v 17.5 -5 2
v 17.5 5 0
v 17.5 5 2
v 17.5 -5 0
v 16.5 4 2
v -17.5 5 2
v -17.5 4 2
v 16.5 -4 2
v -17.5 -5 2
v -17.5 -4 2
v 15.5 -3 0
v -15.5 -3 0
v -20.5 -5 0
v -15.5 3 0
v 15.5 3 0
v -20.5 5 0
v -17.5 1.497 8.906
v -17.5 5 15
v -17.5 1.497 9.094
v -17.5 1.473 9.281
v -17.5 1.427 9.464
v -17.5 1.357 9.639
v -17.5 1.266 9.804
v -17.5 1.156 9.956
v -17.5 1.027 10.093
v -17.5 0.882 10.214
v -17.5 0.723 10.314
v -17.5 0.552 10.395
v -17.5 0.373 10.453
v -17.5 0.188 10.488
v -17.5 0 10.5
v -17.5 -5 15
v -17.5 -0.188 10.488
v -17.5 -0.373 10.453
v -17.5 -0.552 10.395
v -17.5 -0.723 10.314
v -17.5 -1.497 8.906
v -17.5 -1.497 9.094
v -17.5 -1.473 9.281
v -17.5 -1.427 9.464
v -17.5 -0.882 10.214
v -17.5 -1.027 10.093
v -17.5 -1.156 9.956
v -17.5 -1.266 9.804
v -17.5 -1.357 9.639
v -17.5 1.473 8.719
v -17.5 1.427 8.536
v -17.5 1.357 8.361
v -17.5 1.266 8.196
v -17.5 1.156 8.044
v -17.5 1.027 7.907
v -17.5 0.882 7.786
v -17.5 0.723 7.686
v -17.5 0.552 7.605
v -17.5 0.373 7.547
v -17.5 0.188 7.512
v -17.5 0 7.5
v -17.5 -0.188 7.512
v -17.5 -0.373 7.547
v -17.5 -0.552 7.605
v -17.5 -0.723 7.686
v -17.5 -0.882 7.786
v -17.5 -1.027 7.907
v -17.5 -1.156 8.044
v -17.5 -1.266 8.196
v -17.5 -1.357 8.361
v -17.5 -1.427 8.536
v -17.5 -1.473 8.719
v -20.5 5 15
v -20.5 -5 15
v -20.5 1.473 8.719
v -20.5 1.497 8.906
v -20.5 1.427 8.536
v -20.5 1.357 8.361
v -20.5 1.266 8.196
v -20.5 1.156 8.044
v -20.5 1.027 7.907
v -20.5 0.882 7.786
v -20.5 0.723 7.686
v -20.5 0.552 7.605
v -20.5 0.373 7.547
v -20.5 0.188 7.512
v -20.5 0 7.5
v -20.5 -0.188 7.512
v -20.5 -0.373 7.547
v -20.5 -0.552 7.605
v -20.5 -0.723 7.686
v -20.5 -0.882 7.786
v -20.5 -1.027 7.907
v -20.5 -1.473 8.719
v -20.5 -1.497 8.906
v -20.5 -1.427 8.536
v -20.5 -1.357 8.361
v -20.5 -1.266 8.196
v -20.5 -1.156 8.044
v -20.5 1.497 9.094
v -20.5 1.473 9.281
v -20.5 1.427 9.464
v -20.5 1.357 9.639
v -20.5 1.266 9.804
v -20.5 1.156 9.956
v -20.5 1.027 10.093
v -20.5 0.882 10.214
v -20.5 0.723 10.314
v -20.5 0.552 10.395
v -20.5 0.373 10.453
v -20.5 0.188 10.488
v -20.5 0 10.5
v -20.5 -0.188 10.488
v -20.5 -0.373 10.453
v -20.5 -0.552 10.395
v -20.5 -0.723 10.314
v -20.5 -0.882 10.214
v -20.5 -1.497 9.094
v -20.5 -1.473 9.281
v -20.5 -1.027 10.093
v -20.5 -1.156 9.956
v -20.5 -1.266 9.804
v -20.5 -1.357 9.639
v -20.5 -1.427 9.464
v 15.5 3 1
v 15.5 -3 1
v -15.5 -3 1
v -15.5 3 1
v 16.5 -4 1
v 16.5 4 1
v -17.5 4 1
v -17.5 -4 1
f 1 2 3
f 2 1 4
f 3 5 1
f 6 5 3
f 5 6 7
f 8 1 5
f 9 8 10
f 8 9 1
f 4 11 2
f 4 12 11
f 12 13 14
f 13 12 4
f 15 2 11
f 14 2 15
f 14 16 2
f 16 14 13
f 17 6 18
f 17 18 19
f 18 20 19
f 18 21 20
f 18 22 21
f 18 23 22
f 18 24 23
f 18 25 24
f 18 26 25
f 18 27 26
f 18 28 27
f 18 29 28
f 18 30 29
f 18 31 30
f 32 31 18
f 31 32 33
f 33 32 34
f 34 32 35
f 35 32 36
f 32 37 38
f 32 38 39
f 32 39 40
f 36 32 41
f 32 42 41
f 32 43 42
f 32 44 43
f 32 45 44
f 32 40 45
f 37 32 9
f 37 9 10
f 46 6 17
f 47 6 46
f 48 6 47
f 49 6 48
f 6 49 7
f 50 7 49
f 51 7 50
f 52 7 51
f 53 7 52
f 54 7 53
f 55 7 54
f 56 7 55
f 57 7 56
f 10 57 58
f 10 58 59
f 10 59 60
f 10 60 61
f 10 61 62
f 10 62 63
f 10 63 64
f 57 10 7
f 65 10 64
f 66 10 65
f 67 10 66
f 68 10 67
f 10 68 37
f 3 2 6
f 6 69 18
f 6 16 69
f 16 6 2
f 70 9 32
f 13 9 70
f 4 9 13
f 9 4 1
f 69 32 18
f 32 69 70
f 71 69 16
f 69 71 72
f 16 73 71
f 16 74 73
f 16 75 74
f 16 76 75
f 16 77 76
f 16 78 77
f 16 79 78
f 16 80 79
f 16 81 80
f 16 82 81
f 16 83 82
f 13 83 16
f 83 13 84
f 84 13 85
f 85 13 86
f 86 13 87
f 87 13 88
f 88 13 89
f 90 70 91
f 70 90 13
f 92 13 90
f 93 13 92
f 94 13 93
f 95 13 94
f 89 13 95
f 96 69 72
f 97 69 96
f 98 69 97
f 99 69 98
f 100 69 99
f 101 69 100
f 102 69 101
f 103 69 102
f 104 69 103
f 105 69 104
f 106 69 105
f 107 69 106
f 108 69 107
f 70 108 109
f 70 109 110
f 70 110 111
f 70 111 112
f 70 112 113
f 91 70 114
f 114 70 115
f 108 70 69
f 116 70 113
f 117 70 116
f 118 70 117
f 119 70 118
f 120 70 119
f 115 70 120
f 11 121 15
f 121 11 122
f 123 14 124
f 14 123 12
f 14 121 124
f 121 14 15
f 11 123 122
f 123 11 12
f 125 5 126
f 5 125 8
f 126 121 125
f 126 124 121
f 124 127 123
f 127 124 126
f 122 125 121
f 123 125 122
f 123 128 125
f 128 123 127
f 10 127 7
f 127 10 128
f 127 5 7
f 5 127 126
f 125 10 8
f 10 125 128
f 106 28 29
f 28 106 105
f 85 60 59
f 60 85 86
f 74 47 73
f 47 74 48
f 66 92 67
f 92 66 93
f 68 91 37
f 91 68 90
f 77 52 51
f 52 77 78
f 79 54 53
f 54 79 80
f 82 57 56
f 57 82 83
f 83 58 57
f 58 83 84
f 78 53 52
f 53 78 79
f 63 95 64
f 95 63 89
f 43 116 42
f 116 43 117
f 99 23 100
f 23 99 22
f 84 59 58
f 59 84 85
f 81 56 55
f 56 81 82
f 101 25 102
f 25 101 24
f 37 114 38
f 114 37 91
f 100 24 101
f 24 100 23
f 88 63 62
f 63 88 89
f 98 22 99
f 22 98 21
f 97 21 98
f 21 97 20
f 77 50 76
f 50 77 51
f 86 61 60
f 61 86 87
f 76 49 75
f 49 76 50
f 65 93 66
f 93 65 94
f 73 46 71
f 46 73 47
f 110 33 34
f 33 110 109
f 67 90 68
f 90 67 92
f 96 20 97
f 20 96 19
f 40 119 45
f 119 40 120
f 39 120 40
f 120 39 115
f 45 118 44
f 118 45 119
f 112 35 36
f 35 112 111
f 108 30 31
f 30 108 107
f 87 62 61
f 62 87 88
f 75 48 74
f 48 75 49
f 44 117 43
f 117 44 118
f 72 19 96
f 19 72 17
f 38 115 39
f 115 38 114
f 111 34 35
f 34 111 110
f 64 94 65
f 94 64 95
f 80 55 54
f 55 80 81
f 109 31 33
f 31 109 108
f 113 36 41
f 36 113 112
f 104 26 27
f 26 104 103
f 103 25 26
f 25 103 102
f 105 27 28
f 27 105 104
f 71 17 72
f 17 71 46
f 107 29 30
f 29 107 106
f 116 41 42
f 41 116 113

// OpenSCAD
$fn = 50;


difference() {
	union() {
		translate(v = [-17.5000000000, -5.0000000000, 0]) {
			rotate(a = [0, 0, 0]) {
				cube(size = [35, 10, 2]);
			}
		}
		translate(v = [-20.5000000000, -5.0000000000, 0]) {
			rotate(a = [0, 0, 0]) {
				cube(size = [3, 10, 15]);
			}
		}
	}
	union() {
		translate(v = [-15.5000000000, -3.0000000000, 0]) {
			rotate(a = [0, 0, 0]) {
				cube(size = [31, 6, 2]);
			}
		}
		translate(v = [-17.5000000000, -4.0000000000, 1]) {
			rotate(a = [0, 0, 0]) {
				cube(size = [34, 8, 1]);
			}
		}
		#translate(v = [-27.5000000000, 0, 9]) {
			rotate(a = [0, 90, 0]) {
				cylinder(h = 20, r = 1.5000000000);
			}
		}
	}
}
